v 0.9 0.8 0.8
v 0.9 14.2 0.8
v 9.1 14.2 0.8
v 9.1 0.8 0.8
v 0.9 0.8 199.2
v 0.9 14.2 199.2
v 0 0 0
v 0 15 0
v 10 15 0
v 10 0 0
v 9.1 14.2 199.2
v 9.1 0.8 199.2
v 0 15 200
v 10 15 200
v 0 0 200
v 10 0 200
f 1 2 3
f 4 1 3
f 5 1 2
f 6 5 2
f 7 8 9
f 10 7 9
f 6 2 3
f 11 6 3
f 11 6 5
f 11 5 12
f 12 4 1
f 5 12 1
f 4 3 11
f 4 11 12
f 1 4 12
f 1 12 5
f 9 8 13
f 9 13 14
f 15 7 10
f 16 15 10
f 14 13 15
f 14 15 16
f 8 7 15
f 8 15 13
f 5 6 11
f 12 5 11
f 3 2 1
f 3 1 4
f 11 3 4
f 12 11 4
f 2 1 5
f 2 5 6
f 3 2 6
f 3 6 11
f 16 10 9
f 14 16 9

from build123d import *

# Parameters (mm, degrees)
SZKIC2_W                    = 10
SZKIC2_H                    = 15
DODANIE_WYCI_GNI_CIE1_DEPTH = 200
PODZIEL1_SURFACE_1_BACK     = 201.811
PODZIEL1_SURFACE_1_DEPTH    = 403.622
PODZIEL1_SURFACE_2_BACK     = 201.811
PODZIEL1_SURFACE_2_DEPTH    = 403.622
PODZIEL2_OUTLINE_W          = 8.2
PODZIEL2_OUTLINE_H          = 13.4
PODZIEL2_DEPTH              = 0.8
PODZIEL2_START              = 199.2
PODZIEL2_2_OUTLINE_W        = 8.2
PODZIEL2_2_OUTLINE_H        = 13.4
PODZIEL2_2_DEPTH            = 0.8
PODZIEL2_3_OUTLINE_W        = 8.2
PODZIEL2_3_OUTLINE_H        = 13.4
PODZIEL2_3_DEPTH            = 0.8
PODZIEL2_4_OUTLINE_W        = 8.2
PODZIEL2_4_OUTLINE_H        = 13.4
PODZIEL2_4_DEPTH            = 0.8


# Read off the part's stored shape, not the designer's step: Podziel2
with BuildPart() as part:
    # Szkic2 → Dodanie-wyciągnięcie1 (new body)
    with BuildSketch(Plane.XY):
        with Locations((5, 7.5)):
            Rectangle(SZKIC2_W, SZKIC2_H)
    extrude(amount=DODANIE_WYCI_GNI_CIE1_DEPTH)


with BuildPart() as body_2:
    # Podziel1: the piece behind the surface
    add(part.part)
    # Podziel1 surface: a surface, the sketch's curves swept straight by 403.622 mm
    with BuildLine(Plane.XY.offset(-PODZIEL1_SURFACE_1_BACK), mode=Mode.PRIVATE) as podziel1_surface_1_path:
        Line((0.9, 14.2), (9.1, 14.2))
        Line((9.1, 14.2), (9.1, 0.8))
        Line((9.1, 0.8), (0.9, 0.8))
        Line((0.9, 0.8), (0.9, 14.2))
    podziel1_surface_1 = Shell.extrude(podziel1_surface_1_path.wire(), (0 * PODZIEL1_SURFACE_1_DEPTH, 0 * PODZIEL1_SURFACE_1_DEPTH, 1 * PODZIEL1_SURFACE_1_DEPTH))
    split(bisect_by=podziel1_surface_1, keep=Keep.BOTTOM)

    # Podziel2 outline → Podziel2 (cut)
    with BuildSketch(Plane.XY):
        with Locations((5, 7.5)):
            Rectangle(PODZIEL2_OUTLINE_W, PODZIEL2_OUTLINE_H)
    extrude(amount=PODZIEL2_DEPTH, mode=Mode.SUBTRACT)

    # Podziel2 2 outline → Podziel2 2 (cut)
    with BuildSketch(Plane.XY.offset(PODZIEL2_START)):
        with Locations((5, 7.5)):
            Rectangle(PODZIEL2_2_OUTLINE_W, PODZIEL2_2_OUTLINE_H)
    extrude(amount=PODZIEL2_2_DEPTH, mode=Mode.SUBTRACT)


with BuildPart() as part_1:
    add(part.part)

    # Podziel1: split by a surface, the side it looks to stays
    # Podziel1 surface: a surface, the sketch's curves swept straight by 403.622 mm
    with BuildLine(Plane.XY.offset(-PODZIEL1_SURFACE_2_BACK), mode=Mode.PRIVATE) as podziel1_surface_2_path:
        Line((0.9, 14.2), (9.1, 14.2))
        Line((9.1, 14.2), (9.1, 0.8))
        Line((9.1, 0.8), (0.9, 0.8))
        Line((0.9, 0.8), (0.9, 14.2))
    podziel1_surface_2 = Shell.extrude(podziel1_surface_2_path.wire(), (0 * PODZIEL1_SURFACE_2_DEPTH, 0 * PODZIEL1_SURFACE_2_DEPTH, 1 * PODZIEL1_SURFACE_2_DEPTH))
    split(bisect_by=podziel1_surface_2, keep=Keep.TOP)


with BuildPart() as body_3:
    # Podziel2 3 outline → Podziel2 3 (new body)
    with BuildSketch(Plane.XY):
        with Locations((5, 7.5)):
            Rectangle(PODZIEL2_3_OUTLINE_W, PODZIEL2_3_OUTLINE_H)
    extrude(amount=PODZIEL2_3_DEPTH)


with BuildPart() as body_4:
    # Podziel2 4 outline → Podziel2 4 (new body)
    with BuildSketch(Plane.XY.offset(PODZIEL2_START)):
        with Locations((5, 7.5)):
            Rectangle(PODZIEL2_4_OUTLINE_W, PODZIEL2_4_OUTLINE_H)
    extrude(amount=PODZIEL2_4_DEPTH)


with BuildPart() as part_2:
    add(part_1.part)

    # Połącz1: union body 4, body 3
    add(body_4.part)
    add(body_3.part)


solid = Compound([body_2.part, part_2.part])
